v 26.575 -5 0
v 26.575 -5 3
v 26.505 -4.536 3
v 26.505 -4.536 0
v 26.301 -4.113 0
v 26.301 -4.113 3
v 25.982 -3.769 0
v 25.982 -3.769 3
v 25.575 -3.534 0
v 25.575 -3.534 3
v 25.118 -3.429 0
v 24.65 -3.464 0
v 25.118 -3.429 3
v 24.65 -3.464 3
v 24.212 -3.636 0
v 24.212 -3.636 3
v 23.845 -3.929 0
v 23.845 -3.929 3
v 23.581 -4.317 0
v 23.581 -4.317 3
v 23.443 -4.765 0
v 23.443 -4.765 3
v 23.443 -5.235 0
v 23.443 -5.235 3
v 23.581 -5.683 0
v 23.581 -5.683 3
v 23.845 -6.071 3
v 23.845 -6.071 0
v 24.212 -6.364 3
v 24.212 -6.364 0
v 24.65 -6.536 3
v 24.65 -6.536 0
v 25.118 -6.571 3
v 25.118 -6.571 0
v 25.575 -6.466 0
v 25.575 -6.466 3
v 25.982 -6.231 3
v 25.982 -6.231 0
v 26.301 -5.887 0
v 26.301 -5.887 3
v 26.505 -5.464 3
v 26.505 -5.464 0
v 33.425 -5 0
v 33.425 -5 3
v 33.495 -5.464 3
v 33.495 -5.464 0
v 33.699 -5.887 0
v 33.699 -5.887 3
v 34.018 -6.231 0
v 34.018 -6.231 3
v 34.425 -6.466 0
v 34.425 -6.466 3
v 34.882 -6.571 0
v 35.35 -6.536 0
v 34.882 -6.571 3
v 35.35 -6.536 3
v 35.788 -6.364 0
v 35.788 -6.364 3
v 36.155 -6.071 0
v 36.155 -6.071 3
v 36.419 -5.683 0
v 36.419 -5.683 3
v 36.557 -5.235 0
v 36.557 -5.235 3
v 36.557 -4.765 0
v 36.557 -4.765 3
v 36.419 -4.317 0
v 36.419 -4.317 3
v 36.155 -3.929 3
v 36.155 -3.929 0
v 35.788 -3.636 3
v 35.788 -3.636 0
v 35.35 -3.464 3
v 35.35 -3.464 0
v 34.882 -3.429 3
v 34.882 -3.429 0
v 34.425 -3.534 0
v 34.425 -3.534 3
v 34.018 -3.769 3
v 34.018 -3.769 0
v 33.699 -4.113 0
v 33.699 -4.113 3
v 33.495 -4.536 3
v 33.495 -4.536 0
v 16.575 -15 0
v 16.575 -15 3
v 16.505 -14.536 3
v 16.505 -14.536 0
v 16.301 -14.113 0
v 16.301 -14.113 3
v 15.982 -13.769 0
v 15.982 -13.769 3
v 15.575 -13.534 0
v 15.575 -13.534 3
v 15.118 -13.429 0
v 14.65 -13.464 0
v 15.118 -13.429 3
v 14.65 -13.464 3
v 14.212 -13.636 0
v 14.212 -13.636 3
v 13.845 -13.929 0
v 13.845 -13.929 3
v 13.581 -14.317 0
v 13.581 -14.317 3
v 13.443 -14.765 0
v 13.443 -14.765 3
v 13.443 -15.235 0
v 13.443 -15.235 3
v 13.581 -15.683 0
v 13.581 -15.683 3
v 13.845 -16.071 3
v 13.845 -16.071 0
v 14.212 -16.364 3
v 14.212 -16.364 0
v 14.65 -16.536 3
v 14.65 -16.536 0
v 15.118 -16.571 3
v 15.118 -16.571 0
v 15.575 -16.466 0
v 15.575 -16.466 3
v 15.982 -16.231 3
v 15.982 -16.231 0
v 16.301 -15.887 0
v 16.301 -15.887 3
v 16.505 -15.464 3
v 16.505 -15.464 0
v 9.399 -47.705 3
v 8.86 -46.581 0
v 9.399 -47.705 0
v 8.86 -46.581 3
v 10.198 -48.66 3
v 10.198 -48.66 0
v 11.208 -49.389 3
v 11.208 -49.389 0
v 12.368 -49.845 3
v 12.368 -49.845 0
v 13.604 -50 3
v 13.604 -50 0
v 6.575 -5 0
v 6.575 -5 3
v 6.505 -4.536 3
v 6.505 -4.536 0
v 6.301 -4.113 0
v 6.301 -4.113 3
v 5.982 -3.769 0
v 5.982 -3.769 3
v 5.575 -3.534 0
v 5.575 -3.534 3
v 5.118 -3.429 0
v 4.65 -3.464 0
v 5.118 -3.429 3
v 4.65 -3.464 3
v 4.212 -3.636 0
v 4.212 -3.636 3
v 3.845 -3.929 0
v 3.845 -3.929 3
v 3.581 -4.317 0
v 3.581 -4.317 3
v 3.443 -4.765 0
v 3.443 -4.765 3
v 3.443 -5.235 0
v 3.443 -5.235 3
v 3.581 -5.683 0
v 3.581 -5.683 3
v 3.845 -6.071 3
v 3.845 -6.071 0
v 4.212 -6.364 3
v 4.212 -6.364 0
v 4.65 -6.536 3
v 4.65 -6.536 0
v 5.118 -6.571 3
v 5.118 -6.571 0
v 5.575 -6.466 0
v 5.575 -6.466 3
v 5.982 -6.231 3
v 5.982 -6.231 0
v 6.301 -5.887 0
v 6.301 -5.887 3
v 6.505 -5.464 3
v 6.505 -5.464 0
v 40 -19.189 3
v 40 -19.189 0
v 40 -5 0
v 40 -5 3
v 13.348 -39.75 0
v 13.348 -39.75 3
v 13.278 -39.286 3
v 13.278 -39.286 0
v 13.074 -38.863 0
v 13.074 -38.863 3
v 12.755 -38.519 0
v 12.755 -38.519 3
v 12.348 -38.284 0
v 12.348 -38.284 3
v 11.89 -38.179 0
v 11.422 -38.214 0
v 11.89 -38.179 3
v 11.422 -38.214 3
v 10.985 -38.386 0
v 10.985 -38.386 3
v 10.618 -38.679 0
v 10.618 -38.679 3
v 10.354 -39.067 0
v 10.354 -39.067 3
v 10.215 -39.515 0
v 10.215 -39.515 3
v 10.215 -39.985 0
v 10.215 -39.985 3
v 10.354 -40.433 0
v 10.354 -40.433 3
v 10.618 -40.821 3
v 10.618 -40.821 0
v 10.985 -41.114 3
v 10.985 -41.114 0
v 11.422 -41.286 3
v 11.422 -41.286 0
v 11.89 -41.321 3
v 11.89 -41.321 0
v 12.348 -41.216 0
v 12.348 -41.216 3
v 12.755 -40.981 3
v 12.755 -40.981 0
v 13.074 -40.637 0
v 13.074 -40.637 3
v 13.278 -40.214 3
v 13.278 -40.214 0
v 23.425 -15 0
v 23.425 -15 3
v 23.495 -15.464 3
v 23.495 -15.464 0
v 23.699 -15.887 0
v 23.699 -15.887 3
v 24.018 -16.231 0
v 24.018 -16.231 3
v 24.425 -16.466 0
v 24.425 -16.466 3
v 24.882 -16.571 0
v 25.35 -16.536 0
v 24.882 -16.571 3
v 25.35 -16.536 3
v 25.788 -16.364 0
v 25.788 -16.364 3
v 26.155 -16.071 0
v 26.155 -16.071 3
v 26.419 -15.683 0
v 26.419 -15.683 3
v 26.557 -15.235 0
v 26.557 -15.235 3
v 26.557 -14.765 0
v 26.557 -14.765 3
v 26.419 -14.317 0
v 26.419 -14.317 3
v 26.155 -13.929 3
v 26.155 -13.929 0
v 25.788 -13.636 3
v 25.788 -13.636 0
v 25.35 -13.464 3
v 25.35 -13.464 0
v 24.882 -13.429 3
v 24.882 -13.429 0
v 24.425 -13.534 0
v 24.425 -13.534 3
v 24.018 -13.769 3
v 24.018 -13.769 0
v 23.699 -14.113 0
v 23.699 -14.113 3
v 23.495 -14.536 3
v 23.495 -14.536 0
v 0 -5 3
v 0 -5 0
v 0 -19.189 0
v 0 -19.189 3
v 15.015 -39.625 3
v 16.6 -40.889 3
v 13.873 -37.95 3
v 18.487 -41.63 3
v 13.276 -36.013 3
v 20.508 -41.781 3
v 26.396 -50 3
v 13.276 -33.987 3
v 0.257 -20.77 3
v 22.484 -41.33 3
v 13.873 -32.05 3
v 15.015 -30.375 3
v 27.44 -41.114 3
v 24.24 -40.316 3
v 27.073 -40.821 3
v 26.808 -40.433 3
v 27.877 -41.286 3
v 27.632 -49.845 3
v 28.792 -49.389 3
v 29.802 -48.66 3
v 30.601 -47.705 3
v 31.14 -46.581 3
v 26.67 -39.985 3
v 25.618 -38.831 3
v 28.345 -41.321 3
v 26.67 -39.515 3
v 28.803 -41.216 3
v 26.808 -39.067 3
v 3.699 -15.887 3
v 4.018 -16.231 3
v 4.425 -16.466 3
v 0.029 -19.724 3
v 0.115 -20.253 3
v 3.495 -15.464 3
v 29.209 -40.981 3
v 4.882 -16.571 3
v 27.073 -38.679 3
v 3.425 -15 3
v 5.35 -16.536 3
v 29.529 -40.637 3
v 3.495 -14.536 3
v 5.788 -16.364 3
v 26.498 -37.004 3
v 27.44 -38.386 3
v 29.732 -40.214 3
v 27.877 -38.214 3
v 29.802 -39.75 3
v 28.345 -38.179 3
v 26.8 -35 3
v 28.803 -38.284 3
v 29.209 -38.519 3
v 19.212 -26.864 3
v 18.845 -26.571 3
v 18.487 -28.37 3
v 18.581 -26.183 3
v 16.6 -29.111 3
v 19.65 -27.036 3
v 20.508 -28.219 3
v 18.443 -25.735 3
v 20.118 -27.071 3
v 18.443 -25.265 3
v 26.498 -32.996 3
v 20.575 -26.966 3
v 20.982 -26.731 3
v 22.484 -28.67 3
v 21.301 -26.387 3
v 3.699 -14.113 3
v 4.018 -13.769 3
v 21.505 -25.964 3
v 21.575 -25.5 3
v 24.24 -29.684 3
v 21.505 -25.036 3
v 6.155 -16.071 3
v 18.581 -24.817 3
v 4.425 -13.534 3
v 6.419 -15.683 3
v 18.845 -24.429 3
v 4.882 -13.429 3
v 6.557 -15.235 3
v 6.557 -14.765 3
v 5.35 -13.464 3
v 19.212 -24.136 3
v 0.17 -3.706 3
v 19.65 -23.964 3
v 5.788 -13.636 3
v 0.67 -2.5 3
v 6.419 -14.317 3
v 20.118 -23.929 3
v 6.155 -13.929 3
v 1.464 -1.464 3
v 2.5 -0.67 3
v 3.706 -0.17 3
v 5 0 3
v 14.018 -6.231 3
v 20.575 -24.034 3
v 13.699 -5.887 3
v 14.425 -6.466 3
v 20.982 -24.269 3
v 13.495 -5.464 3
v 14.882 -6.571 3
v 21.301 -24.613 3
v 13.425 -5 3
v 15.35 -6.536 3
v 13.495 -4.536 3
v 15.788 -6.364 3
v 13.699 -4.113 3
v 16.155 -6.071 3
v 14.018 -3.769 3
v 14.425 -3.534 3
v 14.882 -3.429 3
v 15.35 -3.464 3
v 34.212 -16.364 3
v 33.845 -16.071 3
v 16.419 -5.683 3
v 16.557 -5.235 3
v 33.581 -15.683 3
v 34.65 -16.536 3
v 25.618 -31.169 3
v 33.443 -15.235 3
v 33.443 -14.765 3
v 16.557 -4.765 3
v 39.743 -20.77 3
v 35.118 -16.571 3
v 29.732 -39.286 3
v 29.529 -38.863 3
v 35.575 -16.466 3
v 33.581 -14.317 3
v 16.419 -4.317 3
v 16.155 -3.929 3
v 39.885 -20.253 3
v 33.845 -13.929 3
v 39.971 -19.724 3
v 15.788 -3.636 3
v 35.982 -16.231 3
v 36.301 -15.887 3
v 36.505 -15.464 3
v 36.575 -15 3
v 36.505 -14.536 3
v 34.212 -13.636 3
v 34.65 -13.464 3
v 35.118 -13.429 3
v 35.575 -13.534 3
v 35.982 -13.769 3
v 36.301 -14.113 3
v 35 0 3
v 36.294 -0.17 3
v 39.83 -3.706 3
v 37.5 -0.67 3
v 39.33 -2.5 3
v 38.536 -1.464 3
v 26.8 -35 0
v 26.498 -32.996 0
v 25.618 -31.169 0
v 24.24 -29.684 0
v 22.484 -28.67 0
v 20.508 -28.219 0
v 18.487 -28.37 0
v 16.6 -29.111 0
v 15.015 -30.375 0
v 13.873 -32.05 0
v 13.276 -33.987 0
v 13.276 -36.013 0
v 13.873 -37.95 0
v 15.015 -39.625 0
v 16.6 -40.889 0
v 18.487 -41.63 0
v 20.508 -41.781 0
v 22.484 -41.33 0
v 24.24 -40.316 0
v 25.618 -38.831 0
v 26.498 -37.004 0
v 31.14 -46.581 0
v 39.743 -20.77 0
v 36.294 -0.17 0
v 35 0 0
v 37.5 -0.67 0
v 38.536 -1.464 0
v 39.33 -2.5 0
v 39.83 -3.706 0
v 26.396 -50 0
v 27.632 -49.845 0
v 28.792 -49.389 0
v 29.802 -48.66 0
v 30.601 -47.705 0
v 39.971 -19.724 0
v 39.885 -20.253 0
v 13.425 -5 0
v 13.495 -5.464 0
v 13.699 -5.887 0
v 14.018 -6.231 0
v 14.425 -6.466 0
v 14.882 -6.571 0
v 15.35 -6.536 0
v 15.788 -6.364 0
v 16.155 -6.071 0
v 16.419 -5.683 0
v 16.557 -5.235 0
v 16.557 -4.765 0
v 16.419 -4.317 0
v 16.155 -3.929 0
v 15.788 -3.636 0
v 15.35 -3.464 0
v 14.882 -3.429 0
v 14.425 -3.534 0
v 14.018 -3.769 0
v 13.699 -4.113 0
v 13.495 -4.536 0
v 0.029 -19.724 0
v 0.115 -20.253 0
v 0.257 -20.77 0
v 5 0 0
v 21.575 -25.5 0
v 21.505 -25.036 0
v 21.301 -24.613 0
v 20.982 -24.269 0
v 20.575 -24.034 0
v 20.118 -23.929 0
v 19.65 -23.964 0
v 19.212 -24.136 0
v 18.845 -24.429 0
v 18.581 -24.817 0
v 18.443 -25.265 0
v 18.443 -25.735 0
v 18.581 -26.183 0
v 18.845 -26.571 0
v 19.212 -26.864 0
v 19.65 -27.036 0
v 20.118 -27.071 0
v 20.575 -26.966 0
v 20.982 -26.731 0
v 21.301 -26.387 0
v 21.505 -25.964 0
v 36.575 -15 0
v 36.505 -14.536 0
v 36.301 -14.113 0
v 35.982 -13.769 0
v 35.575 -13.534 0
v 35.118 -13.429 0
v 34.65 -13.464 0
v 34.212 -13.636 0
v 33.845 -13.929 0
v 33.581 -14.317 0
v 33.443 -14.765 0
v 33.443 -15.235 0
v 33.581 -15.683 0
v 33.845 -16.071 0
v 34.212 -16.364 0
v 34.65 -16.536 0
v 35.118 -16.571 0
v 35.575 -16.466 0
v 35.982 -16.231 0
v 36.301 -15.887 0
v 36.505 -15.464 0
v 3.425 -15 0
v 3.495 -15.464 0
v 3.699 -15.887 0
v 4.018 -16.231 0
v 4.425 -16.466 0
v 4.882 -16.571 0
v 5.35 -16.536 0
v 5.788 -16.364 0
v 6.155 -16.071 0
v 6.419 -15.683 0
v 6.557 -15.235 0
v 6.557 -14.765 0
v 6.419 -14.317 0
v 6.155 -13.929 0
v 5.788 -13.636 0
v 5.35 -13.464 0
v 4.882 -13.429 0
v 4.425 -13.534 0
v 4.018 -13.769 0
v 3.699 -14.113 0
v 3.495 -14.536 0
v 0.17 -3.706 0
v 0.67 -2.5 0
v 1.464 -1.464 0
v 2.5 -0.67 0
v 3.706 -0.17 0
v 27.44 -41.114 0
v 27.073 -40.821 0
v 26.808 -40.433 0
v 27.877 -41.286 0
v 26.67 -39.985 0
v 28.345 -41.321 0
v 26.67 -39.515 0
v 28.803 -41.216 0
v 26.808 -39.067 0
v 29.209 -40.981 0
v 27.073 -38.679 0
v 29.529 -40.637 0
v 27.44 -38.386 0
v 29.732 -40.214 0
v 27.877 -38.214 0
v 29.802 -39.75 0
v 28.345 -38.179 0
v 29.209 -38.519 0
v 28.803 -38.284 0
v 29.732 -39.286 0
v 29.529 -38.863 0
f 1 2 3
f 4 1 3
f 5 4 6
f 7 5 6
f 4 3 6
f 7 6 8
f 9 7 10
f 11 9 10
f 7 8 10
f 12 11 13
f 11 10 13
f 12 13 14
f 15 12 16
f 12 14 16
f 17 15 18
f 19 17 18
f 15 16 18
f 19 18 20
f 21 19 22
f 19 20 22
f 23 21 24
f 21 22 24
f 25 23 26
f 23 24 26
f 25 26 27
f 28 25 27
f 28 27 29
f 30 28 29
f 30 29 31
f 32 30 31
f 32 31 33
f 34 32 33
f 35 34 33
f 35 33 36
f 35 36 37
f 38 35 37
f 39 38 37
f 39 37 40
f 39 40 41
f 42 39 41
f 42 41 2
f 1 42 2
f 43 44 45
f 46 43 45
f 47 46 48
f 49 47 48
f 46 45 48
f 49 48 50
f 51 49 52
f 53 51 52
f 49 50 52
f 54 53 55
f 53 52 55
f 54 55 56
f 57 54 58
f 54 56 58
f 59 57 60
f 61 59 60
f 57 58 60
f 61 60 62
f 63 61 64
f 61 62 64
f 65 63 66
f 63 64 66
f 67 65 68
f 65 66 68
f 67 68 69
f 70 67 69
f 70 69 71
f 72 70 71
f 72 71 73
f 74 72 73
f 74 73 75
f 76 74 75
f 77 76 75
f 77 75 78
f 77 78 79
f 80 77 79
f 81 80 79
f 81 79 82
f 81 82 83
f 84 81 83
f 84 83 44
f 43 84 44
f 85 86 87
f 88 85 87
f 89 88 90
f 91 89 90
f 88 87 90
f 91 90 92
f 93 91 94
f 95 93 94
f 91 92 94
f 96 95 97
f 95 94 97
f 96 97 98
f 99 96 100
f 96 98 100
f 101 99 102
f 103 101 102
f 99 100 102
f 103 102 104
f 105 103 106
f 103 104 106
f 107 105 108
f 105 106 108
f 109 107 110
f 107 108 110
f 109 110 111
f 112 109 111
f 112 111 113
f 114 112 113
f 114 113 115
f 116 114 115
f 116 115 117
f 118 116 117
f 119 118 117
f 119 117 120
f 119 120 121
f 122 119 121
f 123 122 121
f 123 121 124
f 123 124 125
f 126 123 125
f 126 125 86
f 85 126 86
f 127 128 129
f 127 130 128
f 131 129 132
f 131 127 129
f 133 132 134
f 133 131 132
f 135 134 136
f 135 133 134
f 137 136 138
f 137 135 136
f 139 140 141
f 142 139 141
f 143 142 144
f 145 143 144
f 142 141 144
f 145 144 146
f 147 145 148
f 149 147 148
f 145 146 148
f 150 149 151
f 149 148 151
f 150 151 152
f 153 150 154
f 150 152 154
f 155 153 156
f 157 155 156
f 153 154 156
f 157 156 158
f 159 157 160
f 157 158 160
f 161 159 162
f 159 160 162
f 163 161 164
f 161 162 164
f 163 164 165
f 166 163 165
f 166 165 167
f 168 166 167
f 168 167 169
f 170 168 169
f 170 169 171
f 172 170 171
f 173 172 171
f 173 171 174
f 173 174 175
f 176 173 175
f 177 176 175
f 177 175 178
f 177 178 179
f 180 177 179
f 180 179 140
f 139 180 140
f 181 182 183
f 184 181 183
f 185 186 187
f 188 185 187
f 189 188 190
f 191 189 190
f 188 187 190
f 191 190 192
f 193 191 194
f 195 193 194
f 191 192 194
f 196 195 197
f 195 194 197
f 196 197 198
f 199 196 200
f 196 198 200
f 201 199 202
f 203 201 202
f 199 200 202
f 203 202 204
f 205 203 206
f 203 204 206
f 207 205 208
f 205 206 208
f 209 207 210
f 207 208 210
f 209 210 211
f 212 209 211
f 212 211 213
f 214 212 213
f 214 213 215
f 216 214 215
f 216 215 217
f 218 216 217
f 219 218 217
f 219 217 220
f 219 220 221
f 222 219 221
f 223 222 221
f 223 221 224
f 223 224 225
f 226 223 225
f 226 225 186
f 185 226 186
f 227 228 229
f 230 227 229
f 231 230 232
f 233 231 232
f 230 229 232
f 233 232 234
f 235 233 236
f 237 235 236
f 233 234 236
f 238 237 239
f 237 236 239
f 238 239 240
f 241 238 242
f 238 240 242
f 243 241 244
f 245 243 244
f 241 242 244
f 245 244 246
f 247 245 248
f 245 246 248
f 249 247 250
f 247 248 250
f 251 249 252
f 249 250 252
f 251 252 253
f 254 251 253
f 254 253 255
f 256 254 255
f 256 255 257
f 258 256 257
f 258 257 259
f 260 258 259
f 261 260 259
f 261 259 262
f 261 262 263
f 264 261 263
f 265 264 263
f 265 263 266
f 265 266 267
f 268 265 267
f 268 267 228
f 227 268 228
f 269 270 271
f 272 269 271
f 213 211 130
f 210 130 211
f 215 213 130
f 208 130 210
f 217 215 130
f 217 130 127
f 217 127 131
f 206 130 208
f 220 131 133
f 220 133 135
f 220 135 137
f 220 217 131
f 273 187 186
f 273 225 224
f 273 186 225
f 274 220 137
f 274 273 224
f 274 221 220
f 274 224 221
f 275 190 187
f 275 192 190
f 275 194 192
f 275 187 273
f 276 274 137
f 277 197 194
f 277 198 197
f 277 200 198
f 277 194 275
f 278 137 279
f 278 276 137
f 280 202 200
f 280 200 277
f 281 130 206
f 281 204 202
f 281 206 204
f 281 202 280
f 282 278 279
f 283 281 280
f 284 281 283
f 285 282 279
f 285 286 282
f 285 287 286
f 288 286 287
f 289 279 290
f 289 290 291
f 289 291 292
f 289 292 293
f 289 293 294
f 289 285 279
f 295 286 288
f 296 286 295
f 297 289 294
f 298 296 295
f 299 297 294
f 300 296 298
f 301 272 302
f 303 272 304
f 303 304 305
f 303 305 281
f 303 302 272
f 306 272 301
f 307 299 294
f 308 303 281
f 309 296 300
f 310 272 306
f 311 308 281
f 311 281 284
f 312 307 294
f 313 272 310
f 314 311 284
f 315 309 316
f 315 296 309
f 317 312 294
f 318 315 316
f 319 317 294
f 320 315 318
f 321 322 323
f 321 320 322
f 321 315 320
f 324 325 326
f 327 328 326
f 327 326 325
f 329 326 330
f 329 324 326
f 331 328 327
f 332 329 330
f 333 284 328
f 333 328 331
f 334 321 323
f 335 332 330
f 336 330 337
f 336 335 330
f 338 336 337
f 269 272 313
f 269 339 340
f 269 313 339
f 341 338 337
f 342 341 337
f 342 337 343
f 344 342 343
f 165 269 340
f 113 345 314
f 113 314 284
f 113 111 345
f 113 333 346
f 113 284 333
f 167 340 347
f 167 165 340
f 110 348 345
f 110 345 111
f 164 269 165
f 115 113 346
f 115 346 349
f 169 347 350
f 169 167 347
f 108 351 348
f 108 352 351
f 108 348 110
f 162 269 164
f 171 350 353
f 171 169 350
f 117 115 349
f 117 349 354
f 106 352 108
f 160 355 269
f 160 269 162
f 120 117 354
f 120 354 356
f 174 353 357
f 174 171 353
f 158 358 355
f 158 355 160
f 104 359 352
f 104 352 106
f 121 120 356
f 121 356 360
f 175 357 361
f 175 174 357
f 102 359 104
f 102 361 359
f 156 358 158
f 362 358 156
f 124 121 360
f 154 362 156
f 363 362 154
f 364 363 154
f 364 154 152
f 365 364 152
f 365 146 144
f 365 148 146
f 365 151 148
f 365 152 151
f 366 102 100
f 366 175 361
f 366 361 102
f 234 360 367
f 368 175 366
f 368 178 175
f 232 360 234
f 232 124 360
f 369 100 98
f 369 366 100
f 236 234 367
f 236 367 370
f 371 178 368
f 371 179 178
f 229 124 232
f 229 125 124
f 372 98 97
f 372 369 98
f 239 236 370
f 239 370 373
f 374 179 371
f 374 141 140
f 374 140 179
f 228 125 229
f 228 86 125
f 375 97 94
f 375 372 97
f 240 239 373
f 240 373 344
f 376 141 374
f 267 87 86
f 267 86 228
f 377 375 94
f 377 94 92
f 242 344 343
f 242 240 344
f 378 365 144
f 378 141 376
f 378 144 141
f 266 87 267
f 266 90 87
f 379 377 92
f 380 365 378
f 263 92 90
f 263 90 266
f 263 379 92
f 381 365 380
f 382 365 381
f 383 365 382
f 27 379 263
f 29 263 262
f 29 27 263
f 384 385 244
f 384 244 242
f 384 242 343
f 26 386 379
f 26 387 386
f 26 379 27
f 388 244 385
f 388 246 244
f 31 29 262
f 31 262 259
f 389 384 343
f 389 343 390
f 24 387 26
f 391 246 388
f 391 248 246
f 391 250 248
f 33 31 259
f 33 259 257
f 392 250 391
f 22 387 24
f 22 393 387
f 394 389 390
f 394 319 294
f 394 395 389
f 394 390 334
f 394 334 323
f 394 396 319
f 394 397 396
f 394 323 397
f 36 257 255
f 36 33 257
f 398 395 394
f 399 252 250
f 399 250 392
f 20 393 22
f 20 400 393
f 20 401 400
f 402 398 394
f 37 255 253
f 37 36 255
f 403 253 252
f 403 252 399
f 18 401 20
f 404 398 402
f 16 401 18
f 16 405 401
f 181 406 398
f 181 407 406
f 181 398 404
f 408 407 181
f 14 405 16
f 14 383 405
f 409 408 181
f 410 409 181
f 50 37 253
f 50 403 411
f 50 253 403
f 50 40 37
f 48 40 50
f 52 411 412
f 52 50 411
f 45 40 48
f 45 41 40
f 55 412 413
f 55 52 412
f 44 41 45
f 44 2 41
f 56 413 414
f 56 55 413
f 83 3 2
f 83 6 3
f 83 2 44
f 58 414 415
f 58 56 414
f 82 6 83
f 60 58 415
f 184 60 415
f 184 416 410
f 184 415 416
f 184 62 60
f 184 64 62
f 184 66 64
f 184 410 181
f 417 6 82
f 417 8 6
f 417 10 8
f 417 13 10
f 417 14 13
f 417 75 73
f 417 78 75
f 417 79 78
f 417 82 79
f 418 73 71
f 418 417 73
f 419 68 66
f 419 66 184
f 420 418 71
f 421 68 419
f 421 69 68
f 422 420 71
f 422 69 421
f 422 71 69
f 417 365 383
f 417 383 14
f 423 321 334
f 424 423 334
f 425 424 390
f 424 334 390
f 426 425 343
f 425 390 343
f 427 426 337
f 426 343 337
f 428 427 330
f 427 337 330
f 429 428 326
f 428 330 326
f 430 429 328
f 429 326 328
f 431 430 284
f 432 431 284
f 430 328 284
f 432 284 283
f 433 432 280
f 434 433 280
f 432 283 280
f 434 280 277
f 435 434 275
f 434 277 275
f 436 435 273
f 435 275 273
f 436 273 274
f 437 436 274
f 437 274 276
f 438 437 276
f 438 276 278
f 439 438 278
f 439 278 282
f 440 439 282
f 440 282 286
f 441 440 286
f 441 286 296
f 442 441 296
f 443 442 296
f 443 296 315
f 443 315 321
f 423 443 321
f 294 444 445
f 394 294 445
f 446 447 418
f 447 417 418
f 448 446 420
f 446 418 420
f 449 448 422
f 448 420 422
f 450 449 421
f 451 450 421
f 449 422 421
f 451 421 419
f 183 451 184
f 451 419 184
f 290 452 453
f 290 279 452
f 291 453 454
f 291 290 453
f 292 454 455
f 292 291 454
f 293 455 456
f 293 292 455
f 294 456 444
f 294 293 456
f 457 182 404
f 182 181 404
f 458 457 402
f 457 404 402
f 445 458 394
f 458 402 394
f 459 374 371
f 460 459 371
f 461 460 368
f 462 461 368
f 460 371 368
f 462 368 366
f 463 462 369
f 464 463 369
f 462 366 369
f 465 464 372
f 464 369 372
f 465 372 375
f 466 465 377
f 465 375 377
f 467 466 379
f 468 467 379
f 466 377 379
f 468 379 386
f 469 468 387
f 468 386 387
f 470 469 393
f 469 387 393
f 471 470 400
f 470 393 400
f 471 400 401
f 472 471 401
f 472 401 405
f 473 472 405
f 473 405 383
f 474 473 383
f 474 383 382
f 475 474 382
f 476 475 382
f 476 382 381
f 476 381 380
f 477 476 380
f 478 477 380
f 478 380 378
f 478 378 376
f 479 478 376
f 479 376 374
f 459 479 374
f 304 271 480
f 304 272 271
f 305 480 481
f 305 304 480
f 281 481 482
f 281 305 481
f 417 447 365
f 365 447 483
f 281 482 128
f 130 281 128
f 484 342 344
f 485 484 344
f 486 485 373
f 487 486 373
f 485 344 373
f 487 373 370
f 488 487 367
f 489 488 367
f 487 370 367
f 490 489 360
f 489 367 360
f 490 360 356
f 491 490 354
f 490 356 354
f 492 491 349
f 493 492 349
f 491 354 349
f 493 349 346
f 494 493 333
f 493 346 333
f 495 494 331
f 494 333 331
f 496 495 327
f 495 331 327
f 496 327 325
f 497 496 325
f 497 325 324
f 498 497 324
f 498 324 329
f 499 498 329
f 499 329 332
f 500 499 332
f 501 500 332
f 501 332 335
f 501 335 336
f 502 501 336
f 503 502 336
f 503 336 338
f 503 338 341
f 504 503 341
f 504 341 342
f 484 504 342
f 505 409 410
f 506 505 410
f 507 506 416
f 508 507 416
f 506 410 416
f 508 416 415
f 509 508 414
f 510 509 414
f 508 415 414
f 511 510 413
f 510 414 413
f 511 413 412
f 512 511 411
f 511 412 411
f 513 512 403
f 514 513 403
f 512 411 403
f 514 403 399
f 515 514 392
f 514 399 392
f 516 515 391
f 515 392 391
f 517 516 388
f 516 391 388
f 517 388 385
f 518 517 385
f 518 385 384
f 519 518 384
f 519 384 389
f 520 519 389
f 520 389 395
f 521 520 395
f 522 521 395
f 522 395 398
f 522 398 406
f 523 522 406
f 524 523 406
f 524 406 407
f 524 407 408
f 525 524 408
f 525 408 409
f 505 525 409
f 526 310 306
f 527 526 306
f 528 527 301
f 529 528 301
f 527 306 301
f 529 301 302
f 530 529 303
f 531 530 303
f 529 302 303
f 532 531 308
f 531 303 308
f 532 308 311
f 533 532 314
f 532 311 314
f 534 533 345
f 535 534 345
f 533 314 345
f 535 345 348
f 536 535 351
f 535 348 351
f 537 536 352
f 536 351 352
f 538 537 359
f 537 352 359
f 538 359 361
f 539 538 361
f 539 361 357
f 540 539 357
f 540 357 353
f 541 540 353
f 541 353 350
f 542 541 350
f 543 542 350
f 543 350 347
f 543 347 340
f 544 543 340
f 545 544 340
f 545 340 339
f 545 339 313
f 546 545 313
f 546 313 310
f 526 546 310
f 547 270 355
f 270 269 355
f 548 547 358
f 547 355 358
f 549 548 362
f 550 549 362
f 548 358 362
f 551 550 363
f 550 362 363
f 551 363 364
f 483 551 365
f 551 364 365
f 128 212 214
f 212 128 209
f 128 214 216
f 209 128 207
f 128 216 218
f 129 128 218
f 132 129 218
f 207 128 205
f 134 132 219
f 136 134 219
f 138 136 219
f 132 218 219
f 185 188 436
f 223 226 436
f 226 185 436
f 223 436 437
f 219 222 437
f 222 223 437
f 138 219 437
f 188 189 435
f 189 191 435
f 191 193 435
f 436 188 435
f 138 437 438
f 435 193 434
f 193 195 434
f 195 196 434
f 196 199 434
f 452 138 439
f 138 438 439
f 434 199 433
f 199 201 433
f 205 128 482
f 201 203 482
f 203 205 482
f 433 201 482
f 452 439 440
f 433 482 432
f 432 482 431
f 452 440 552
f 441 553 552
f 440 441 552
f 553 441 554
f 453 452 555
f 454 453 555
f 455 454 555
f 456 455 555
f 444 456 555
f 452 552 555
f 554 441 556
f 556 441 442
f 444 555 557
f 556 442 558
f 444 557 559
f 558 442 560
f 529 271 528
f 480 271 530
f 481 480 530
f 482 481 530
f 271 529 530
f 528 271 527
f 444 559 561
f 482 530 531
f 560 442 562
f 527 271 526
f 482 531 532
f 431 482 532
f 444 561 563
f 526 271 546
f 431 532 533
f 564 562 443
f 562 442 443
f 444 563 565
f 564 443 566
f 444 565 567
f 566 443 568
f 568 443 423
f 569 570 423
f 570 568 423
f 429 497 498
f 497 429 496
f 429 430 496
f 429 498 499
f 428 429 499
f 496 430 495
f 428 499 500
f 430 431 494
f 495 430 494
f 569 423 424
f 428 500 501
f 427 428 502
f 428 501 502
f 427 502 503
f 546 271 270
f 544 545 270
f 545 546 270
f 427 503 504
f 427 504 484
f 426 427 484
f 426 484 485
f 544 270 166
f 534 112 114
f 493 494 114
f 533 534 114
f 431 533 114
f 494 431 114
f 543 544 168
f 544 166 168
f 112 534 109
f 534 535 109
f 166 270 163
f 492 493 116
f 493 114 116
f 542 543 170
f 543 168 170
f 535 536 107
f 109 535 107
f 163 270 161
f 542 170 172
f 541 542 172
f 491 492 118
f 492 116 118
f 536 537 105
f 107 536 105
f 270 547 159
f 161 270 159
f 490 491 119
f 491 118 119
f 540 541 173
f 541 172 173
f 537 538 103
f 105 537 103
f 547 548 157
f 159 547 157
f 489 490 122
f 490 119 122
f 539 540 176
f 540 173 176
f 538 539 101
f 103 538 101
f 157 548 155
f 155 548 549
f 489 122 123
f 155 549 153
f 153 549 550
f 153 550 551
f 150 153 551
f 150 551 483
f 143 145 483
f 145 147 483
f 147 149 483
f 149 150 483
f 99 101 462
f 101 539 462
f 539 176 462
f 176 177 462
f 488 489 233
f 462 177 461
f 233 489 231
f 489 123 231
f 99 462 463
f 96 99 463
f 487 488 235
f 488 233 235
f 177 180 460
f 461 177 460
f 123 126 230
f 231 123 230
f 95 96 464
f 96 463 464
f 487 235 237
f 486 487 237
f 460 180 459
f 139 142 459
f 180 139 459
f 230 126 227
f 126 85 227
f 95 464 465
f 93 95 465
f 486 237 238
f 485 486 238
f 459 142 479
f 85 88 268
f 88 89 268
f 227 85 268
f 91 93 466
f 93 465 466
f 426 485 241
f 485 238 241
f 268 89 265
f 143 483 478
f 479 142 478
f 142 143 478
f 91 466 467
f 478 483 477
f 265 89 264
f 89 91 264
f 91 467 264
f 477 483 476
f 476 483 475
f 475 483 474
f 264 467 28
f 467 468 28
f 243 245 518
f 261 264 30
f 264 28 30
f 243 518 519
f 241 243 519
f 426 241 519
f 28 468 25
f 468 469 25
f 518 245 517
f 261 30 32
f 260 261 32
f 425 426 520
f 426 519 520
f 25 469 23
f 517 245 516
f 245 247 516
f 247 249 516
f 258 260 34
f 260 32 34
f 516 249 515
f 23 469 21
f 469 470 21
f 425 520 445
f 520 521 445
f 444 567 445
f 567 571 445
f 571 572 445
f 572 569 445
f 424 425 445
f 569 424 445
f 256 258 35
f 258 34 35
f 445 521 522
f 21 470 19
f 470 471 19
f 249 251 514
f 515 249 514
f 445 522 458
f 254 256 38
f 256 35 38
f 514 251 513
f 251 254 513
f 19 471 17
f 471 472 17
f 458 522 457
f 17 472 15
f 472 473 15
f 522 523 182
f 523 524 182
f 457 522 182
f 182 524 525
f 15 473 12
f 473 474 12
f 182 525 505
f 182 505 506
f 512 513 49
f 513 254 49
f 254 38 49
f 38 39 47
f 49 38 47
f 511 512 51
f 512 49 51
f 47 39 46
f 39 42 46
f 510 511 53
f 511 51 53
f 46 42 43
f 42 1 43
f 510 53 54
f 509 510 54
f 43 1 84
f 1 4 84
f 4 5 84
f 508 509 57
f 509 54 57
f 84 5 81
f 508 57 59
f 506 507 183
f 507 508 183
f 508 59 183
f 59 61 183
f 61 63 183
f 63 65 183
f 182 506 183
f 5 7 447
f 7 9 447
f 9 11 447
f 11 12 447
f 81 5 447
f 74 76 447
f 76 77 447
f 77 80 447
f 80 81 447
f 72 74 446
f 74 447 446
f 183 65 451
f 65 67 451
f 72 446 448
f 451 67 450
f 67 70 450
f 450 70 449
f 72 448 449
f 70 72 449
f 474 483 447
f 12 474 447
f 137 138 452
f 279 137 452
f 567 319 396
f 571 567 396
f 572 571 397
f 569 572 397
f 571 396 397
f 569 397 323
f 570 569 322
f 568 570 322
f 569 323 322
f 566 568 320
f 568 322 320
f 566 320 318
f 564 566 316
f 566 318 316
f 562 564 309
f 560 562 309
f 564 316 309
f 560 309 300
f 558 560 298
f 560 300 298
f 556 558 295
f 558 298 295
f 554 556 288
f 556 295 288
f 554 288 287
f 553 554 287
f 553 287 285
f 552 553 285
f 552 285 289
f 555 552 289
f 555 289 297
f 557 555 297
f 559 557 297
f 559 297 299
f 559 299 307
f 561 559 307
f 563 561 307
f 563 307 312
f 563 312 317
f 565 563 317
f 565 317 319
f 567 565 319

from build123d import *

# Parameters (mm, degrees)
EXTRUDE_1_DEPTH     = 3
SKETCH_2_R          = 1.575
SKETCH_2_R_2        = 6.8
CUT_EXTRUDE_2_DEPTH = 65.101482042
FILLET_1_R          = 5


with BuildPart() as part:
    # 草图1 → 凸台-拉伸1 (new body)
    with BuildSketch(Plane.XY):
        Polygon((0, 0), (0, -20), (10, -50), (30, -50), (40, -20), (40, 0), align=None)
    extrude(amount=EXTRUDE_1_DEPTH)

    # 草图2 → 切除-拉伸2 (cut, through all)
    with BuildSketch(Plane.XY.offset(3)):
        with Locations((5, -5)):
            Circle(SKETCH_2_R)
        with Locations(Location((15, -5, 0), (0, 0, 180))):
            Circle(SKETCH_2_R)
        with Locations((15, -15)):
            Circle(SKETCH_2_R)
        with Locations(Location((5, -15, 0), (0, 0, 180))):
            Circle(SKETCH_2_R)
        with Locations((35, -15)):
            Circle(SKETCH_2_R)
        with Locations(Location((25, -15, 0), (0, 0, 180))):
            Circle(SKETCH_2_R)
        with Locations((25, -5)):
            Circle(SKETCH_2_R)
        with Locations(Location((35, -5, 0), (0, 0, 180))):
            Circle(SKETCH_2_R)
        with Locations((20, -35)):
            Circle(SKETCH_2_R_2)
        with Locations((20, -25.5)):
            Circle(SKETCH_2_R)
        with Locations((28.227241336, -39.75)):
            Circle(SKETCH_2_R)
        with Locations((11.772758664, -39.75)):
            Circle(SKETCH_2_R)
    extrude(amount=-CUT_EXTRUDE_2_DEPTH, mode=Mode.SUBTRACT)

    # 圆角1
    fillet_1_edges = [part.edges().sort_by_distance(p)[0] for p in [
        (40, 0, 1.5),
        (40, -20, 1.5),
        (30, -50, 1.5),
        (10, -50, 1.5),
        (0, -20, 1.5),
        (0, 0, 1.5),
    ]]
    fillet(fillet_1_edges, radius=FILLET_1_R)


solid = part.part
